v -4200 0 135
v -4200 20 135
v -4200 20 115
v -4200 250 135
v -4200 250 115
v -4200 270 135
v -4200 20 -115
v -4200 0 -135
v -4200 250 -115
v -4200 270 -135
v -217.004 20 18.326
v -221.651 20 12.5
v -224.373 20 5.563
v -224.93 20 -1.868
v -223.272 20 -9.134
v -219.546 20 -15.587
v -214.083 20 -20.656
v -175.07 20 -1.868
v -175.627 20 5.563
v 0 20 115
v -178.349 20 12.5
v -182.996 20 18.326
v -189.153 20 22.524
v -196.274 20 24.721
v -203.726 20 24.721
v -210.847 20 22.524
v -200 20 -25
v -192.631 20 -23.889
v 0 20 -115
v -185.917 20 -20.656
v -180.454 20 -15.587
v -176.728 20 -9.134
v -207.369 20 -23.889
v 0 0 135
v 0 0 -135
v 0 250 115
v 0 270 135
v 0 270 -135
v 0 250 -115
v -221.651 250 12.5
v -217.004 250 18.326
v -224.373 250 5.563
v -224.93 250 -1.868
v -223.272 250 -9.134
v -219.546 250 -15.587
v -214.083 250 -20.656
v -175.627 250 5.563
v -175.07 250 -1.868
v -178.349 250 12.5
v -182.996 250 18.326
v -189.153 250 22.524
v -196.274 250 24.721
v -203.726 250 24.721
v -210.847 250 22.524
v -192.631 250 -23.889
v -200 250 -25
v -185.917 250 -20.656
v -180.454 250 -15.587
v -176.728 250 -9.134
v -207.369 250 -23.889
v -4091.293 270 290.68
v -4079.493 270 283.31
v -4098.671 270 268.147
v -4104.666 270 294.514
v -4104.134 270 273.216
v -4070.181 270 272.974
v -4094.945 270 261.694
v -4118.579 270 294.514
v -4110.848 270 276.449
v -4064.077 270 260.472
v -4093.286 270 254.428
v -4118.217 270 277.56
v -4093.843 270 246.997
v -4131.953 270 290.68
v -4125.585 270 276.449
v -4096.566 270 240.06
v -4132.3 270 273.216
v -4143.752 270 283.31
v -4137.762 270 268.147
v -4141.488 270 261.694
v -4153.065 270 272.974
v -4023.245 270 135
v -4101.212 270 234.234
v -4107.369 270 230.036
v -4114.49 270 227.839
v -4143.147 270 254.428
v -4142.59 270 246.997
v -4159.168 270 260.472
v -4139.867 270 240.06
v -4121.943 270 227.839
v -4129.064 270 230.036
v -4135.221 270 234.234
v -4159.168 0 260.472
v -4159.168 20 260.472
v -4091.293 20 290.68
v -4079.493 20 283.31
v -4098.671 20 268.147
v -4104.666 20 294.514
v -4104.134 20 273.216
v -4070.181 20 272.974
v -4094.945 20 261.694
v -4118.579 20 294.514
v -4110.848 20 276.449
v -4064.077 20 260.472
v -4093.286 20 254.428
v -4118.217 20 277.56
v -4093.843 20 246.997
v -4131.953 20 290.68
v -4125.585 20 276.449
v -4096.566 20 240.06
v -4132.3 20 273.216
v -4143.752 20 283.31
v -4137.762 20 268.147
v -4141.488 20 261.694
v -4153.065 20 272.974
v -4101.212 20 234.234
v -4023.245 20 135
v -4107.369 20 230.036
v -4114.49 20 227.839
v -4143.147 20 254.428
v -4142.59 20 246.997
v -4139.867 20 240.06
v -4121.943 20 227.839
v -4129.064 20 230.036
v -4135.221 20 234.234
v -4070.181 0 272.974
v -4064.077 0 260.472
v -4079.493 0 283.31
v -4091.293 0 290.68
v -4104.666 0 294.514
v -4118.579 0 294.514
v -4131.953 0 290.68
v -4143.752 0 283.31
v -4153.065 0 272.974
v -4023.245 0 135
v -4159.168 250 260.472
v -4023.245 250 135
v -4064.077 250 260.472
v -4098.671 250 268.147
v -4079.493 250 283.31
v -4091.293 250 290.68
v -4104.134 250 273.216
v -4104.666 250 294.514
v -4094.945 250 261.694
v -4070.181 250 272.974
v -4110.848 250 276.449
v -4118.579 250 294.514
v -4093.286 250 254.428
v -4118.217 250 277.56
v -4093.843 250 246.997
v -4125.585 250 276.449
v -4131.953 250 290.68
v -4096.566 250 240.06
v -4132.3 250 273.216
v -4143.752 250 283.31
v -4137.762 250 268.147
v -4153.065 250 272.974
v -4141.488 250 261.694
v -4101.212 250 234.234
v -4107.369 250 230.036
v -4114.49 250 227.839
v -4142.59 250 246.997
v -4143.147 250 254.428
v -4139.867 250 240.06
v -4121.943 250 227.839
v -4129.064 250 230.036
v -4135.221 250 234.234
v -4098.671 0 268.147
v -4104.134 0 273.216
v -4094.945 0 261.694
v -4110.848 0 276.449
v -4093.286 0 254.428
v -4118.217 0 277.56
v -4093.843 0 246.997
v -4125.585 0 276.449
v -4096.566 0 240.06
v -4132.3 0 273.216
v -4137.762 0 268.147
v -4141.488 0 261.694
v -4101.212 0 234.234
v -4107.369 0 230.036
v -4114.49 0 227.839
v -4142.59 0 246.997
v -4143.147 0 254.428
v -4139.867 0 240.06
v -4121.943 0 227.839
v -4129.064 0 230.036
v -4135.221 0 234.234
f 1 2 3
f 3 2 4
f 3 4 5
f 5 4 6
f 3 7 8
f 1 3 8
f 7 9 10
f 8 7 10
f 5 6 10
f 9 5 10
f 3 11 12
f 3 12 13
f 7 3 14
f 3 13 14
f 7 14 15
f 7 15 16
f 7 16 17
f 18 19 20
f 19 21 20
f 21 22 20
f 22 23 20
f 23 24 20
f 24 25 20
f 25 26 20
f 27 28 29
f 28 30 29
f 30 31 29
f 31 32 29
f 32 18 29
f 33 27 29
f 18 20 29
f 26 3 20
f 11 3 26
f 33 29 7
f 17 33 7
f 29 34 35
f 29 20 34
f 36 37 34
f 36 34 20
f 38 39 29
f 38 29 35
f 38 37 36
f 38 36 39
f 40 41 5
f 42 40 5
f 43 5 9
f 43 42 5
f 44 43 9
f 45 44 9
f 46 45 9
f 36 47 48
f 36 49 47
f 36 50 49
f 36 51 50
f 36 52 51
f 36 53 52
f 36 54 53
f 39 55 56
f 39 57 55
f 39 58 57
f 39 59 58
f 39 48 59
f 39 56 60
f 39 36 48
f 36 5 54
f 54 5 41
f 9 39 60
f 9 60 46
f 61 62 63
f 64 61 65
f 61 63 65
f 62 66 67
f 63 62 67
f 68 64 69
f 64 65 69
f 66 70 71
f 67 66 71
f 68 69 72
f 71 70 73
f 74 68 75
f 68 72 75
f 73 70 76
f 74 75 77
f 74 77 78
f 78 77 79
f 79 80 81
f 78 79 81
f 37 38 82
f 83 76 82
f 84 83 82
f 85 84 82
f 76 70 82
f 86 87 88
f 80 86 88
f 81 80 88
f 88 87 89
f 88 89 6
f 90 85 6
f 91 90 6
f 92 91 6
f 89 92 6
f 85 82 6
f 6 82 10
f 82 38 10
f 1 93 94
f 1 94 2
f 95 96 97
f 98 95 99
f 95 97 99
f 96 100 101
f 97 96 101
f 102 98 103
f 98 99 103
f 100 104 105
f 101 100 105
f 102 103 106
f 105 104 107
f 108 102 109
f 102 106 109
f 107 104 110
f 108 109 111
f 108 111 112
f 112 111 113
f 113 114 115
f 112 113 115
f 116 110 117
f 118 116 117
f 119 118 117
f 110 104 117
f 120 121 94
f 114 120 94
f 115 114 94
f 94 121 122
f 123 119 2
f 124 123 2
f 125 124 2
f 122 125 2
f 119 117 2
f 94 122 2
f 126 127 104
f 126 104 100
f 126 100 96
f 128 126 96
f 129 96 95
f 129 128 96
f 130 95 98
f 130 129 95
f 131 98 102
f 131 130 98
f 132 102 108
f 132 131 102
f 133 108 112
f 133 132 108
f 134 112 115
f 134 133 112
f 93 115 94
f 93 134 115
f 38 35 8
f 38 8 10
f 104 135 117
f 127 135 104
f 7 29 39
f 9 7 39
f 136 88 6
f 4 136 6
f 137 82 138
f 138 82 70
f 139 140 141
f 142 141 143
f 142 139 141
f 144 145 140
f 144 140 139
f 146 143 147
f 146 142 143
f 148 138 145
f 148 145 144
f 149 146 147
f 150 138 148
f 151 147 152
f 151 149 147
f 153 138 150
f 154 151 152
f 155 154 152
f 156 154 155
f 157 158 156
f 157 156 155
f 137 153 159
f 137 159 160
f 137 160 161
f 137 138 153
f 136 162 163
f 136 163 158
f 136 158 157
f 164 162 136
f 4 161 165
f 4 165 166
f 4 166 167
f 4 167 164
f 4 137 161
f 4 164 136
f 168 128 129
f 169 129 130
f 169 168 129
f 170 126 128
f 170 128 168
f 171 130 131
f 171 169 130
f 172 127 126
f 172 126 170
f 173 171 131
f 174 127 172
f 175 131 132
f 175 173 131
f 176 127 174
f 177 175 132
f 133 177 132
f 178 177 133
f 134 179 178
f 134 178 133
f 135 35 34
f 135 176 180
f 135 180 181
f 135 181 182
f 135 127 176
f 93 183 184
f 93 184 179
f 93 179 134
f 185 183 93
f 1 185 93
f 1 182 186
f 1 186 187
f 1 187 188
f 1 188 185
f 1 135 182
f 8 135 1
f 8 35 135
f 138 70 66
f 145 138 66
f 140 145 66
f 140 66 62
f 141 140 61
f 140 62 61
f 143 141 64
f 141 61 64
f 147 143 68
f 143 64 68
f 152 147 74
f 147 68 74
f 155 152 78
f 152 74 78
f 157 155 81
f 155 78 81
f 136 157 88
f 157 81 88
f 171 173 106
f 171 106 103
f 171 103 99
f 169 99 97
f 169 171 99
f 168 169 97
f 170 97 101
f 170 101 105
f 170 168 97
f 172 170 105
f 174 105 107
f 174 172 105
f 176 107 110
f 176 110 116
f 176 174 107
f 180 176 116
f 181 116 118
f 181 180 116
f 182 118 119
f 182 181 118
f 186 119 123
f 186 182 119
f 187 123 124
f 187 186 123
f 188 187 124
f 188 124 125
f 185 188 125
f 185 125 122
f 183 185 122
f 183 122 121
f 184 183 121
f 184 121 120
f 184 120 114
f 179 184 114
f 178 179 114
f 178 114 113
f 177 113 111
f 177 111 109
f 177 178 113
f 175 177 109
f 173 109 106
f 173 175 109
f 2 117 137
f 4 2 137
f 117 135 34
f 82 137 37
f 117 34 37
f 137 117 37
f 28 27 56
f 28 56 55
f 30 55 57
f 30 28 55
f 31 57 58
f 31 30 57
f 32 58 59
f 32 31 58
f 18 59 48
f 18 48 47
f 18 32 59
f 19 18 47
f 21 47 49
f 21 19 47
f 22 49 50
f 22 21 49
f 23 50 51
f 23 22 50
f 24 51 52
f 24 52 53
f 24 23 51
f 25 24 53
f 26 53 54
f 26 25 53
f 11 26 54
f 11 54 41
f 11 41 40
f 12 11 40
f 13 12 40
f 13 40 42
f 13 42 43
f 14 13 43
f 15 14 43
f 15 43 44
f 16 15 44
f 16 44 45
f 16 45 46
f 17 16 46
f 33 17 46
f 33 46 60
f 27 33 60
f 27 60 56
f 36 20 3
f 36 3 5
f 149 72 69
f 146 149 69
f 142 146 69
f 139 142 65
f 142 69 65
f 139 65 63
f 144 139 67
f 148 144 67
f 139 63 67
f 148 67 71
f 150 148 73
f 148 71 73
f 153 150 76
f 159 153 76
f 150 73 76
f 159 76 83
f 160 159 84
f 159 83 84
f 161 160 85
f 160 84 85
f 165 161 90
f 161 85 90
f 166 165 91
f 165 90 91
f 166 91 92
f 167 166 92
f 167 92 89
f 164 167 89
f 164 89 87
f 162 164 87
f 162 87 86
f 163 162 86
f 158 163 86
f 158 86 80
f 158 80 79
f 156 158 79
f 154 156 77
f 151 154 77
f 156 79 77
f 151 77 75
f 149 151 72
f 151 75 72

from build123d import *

# Parameters (mm, degrees)
SKETCH1_W           = 270
SKETCH1_H           = 270
SKETCH1_W_2         = 230
SKETCH1_H_2         = 230
BOSS_EXTRUDE1_DEPTH = 4200
BOSS_EXTRUDE2_REACH = 4212.834
SKETCH2_R           = 25
SKETCH3_R           = 25
BOSS_EXTRUDE3_DEPTH = 20


with BuildPart() as part:
    # Sketch1 → Boss-Extrude1 (new body)
    with BuildSketch(Plane(origin=(0, 0, 0), x_dir=(0, 0, -1), z_dir=(1, 0, 0))):
        with Locations((0, 135)):
            Rectangle(SKETCH1_W, SKETCH1_H)
        with Locations((0, 135)):
            Rectangle(SKETCH1_W_2, SKETCH1_H_2, mode=Mode.SUBTRACT)
    extrude(amount=-BOSS_EXTRUDE1_DEPTH)

    # Sketch2 → Boss-Extrude2 (add, up to next)
    with BuildSketch(Plane.XZ, mode=Mode.PRIVATE) as boss_extrude2_sk1:
        with Locations(Location((-200, 0, 0), (0, 0, 270))):
            Circle(SKETCH2_R)
    boss_extrude2_tool1 = extrude(boss_extrude2_sk1.sketch, amount=-BOSS_EXTRUDE2_REACH, mode=Mode.PRIVATE) - part.part
    add(boss_extrude2_tool1.solids().sort_by_distance((-200, 0, 0))[0])

    # Sketch3 → Boss-Extrude3 (add)
    with BuildSketch(Plane(origin=(0, 0, 0), x_dir=(1, 0, 0), z_dir=(0, 1, 0))):
        with BuildLine():
            Line((-4023.2452538, -135), (-4064.076833276, -260.472475841))
            ThreePointArc((-4064.076833276, -260.472475841), (-4111.6226269, -295), (-4159.168420524, -260.472475841))
            Line((-4159.168420524, -260.472475841), (-4200, -135))
            Line((-4200, -135), (-4023.2452538, -135))
        make_face()
        with Locations(Location((-4118.216527145, -252.56, 0), (0, 0, 270))):
            Circle(SKETCH3_R, mode=Mode.SUBTRACT)
    boss_extrude3 = extrude(amount=BOSS_EXTRUDE3_DEPTH)

    # Mirror1: Boss-Extrude3 across plane
    add(boss_extrude3.mirror(Plane(origin=(0, 135, 0), x_dir=(0, 0, 1), z_dir=(0, -1, 0))))


solid = part.part
